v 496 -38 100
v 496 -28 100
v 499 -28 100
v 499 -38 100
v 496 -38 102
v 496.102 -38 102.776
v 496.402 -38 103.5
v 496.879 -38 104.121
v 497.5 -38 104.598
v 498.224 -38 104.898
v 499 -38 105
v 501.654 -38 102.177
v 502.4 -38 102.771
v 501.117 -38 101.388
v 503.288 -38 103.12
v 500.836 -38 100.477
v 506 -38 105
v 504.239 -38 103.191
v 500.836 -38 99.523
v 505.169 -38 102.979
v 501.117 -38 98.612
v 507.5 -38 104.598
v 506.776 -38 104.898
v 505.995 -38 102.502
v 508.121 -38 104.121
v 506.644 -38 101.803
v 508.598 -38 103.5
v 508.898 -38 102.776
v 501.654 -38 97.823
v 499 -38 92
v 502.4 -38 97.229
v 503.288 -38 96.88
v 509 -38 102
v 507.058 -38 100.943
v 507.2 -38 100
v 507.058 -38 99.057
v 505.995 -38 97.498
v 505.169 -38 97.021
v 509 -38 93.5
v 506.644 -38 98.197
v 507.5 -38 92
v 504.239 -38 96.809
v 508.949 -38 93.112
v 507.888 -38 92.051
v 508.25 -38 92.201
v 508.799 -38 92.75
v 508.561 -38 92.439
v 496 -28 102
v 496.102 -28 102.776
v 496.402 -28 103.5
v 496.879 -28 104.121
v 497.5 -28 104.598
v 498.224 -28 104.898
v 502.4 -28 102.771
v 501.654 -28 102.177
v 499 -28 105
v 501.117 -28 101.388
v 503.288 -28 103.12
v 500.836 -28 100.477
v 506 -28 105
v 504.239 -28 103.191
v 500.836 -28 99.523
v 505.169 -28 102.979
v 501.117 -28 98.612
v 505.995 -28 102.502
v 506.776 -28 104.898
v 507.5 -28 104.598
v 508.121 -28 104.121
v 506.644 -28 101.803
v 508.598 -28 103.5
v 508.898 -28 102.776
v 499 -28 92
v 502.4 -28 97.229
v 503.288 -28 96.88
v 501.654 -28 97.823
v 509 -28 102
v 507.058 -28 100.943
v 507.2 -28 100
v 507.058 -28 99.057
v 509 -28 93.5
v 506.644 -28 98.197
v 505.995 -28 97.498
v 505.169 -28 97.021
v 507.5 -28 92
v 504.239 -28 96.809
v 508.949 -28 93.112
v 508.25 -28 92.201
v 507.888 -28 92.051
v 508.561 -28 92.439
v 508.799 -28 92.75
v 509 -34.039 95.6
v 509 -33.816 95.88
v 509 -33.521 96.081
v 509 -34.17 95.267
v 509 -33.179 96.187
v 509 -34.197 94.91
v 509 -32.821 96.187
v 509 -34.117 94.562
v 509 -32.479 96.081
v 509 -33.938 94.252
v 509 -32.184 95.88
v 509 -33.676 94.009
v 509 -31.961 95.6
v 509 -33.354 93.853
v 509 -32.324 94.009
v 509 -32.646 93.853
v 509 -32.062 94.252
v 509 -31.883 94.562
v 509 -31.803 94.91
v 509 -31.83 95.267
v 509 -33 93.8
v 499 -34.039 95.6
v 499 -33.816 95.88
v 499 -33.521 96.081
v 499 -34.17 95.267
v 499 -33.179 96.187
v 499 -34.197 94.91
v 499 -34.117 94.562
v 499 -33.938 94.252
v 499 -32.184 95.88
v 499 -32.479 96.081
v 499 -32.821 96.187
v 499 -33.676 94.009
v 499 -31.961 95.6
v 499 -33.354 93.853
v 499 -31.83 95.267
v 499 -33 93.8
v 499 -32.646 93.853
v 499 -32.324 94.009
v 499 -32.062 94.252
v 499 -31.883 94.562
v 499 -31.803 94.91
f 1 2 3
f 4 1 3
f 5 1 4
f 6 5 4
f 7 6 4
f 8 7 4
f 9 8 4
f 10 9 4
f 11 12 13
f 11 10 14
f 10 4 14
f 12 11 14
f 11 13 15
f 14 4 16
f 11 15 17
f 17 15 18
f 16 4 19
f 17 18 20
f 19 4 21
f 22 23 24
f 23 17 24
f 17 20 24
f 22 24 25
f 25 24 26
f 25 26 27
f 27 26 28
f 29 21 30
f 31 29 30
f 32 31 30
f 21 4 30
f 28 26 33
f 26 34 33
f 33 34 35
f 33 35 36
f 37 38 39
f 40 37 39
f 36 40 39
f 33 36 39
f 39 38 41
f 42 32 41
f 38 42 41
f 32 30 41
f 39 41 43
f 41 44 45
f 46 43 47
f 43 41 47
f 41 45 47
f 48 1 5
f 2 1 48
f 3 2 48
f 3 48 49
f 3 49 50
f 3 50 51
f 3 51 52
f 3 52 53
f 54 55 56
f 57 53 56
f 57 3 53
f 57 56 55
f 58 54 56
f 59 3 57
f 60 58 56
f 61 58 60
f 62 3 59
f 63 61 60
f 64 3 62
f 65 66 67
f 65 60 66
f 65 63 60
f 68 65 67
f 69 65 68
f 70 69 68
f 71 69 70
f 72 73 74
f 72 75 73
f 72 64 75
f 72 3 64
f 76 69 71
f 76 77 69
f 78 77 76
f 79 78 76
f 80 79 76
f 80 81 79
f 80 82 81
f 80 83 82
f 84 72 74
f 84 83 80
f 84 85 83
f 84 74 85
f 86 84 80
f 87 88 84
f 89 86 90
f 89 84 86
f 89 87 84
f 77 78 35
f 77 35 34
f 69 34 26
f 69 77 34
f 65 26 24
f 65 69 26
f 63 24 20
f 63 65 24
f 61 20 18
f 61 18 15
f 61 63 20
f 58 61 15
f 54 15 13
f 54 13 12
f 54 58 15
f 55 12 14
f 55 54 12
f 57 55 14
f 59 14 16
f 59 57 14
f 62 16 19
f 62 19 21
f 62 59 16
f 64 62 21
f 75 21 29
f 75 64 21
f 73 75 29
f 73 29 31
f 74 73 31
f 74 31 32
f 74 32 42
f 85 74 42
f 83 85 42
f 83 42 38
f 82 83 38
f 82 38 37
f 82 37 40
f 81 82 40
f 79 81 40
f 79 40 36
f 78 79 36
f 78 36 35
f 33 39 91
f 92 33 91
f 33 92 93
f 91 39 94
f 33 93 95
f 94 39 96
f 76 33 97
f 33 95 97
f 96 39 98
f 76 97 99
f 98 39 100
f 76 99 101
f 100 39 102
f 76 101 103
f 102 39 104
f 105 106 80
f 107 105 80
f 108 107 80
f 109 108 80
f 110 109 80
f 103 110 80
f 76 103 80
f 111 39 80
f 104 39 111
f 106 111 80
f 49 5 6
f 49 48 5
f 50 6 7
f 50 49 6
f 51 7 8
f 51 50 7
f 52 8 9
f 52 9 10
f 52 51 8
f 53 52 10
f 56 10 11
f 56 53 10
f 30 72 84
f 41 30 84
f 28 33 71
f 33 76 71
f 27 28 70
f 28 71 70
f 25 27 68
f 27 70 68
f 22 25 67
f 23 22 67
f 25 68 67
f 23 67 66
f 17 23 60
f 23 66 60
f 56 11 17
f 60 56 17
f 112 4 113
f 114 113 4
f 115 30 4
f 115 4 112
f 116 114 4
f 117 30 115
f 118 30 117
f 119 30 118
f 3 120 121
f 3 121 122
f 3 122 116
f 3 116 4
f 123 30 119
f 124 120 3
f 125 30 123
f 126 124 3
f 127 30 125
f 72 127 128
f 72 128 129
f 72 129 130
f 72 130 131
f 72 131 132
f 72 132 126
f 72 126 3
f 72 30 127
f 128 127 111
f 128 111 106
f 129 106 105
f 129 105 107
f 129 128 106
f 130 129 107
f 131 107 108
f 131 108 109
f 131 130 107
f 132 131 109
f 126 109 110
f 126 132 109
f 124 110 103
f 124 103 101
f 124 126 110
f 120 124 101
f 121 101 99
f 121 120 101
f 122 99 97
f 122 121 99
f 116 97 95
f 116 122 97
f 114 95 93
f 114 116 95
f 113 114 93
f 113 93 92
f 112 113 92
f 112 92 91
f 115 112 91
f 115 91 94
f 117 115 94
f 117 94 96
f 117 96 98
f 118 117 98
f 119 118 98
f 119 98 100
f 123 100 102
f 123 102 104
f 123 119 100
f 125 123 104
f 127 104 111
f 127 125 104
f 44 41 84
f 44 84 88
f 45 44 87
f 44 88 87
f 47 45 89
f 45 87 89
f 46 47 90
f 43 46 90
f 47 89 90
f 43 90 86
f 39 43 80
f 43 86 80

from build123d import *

# Parameters (mm, degrees)
CYLINDER044_R           = 3.2
CYLINDER044_DEPTH       = 156
CYLINDER044_ROLL_ANGLE  = 90
CYLINDER042_R           = 1.2
CYLINDER042_DEPTH       = 10
CYLINDER042_PITCH_ANGLE = 90
BOX028_W                = 3
BOX028_H                = 10
BOX028_DEPTH            = 8
BOX027_W                = 13
BOX027_H                = 10
BOX027_DEPTH            = 13
FILLET_R                = 3
FILLET001_R             = 1.5


with BuildPart() as cylinder044:
    # Cylinder044 → Cylinder044 (new body)
    with BuildSketch(Plane.XY):
        Circle(CYLINDER044_R)
    extrude(amount=CYLINDER044_DEPTH)


with BuildPart() as cylinder044_1:
    # Cylinder044 roll: moved
    add(cylinder044.part.rotate(Axis((0, 0, 0), (1, 0, 0)), CYLINDER044_ROLL_ANGLE))


with BuildPart() as cylinder044_2:
    # Cylinder044 placement: moved
    add(cylinder044_1.part.moved(Location((504, 118, 100))))


with BuildPart() as cylinder042:
    # Cylinder042 → Cylinder042 (new body)
    with BuildSketch(Plane.XY):
        Circle(CYLINDER042_R)
    extrude(amount=CYLINDER042_DEPTH)


with BuildPart() as cylinder042_1:
    # Cylinder042 pitch: moved
    add(cylinder042.part.rotate(Axis((0, 0, 0), (0, 1, 0)), CYLINDER042_PITCH_ANGLE))


with BuildPart() as cylinder042_2:
    # Cylinder042 placement: moved
    add(cylinder042_1.part.moved(Location((499, -33, 95))))


with BuildPart() as box028:
    # Box028 → Box028 (new body)
    with BuildSketch(Plane(origin=(499, -38, 92), x_dir=(1, 0, 0), z_dir=(0, 0, 1))):
        with Locations((1.5, 5)):
            Rectangle(BOX028_W, BOX028_H)
    extrude(amount=BOX028_DEPTH)


with BuildPart() as cut018:
    # Box027 → Box027 (new body)
    with BuildSketch(Plane(origin=(499, -38, 92), x_dir=(1, 0, 0), z_dir=(0, 0, 1))):
        with Locations((6.5, 5)):
            Rectangle(BOX027_W, BOX027_H)
    extrude(amount=BOX027_DEPTH)

    # Fillet
    fillet_edges = [cut018.edges().sort_by_distance(p)[0] for p in [
        (499, -33, 105),
        (512, -33, 105),
    ]]
    fillet(fillet_edges, radius=FILLET_R)

    # Fillet001
    fillet001_edges = [cut018.edges().sort_by_distance(p)[0] for p in [
        (512, -33, 92),
    ]]
    fillet(fillet001_edges, radius=FILLET001_R)

    # Cut016: cut Box028
    add(box028.part, mode=Mode.SUBTRACT)


with BuildPart() as cut018_1:
    # Cut016 placement: moved
    add(cut018.part.moved(Location((-3, 0, 0))))

    # Cut017: cut Cylinder042
    add(cylinder042_2.part, mode=Mode.SUBTRACT)

    # Cut018: cut Cylinder044
    add(cylinder044_2.part, mode=Mode.SUBTRACT)


solid = cut018_1.part
